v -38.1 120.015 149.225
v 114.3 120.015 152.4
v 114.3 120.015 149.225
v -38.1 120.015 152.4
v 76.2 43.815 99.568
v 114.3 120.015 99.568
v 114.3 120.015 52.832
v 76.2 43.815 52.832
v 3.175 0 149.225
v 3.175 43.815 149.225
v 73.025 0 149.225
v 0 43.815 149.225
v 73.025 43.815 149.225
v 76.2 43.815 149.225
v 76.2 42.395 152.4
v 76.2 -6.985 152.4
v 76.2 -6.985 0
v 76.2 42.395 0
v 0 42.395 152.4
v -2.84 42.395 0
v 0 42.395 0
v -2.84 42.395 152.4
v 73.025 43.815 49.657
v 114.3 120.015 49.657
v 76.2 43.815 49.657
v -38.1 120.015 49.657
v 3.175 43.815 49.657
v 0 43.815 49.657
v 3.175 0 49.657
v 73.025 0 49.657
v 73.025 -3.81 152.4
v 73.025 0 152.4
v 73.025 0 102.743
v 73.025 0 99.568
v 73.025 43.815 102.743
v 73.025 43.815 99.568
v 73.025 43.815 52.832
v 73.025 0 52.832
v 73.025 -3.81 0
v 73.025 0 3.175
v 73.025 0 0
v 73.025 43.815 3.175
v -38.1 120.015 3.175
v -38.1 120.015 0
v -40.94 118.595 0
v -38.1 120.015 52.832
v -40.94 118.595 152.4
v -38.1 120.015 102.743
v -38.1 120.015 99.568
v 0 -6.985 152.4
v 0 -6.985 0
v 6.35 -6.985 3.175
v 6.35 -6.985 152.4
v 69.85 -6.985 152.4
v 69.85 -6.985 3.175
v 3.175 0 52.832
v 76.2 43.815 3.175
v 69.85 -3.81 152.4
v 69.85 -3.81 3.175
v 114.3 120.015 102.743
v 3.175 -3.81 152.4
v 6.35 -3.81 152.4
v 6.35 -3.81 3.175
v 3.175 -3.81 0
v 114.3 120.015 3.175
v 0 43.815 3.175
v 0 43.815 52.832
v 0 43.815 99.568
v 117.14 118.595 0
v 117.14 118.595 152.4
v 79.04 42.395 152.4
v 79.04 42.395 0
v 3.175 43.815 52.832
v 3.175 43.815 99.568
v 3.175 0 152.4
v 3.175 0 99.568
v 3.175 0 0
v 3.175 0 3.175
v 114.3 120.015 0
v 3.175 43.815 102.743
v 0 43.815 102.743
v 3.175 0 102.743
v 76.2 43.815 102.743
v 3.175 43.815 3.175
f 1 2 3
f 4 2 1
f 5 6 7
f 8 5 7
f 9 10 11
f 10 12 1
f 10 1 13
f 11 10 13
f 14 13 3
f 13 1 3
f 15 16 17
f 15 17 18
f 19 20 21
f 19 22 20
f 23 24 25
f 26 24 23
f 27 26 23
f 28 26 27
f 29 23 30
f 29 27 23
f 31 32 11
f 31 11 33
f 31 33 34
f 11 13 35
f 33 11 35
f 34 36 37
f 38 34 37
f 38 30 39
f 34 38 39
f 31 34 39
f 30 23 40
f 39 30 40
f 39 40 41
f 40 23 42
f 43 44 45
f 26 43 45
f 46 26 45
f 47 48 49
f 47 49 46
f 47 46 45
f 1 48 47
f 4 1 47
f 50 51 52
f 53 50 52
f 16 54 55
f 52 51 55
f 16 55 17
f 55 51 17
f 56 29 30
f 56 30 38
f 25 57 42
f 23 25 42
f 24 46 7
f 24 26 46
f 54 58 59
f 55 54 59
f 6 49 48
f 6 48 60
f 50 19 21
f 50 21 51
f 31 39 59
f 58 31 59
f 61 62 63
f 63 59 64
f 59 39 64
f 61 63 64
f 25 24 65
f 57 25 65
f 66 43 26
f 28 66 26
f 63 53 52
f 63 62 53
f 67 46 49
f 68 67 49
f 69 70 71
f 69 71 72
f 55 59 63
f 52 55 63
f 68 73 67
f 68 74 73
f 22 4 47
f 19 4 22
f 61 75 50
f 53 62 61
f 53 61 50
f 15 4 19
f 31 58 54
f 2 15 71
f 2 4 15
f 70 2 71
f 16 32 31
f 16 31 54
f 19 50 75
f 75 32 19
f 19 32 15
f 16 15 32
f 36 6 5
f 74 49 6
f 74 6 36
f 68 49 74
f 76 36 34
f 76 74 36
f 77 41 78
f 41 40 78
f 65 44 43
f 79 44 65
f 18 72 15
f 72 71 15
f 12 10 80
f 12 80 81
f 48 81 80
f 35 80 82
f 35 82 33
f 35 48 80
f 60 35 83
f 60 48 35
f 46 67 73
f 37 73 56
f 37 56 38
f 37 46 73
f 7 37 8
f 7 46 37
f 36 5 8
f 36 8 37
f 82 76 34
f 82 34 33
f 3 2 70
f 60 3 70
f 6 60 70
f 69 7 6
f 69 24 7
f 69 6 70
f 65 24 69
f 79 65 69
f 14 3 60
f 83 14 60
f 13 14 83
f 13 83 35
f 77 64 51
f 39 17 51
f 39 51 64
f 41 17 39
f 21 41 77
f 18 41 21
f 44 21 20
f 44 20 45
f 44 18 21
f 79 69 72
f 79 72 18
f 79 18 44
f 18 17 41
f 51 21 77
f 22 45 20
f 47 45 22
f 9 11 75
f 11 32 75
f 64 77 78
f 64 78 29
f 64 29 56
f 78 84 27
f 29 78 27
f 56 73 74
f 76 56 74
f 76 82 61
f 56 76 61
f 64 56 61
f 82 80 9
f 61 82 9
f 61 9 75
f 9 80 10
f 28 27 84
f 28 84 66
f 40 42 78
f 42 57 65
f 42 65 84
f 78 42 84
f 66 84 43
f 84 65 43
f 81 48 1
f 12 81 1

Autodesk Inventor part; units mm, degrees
ref_plane "YZ Plane" through (0, 0, 0) normal (1, 0, 0) x (0, 1, 0)
ref_plane "XZ Plane" through (0, 0, 0) normal (0, 1, 0) x (-1, 0, 0)
ref_plane "XY Plane" through (0, 0, 0) normal (0, 0, 1) x (1, 0, 0)
sketch "Sketch1" plane through (0, 0, 0) normal (0, 1, 0) x (-1, 0, 0)
  line L0 (0, 0) -> (-76.2, 0)
  line L1 (-76.2, 0) -> (-76.2, 152.4)
  line L2 (-76.2, 152.4) -> (0, 152.4)
  line L3 (0, 152.4) -> (0, 0)
  line L4 (-3.175, 149.225) -> (-73.025, 149.225)
  line L5 (-73.025, 149.225) -> (-73.025, 3.175)
  line L6 (-73.025, 3.175) -> (-3.175, 3.175)
  line L7 (-3.175, 3.175) -> (-3.175, 149.225)
  dimension "d0" = 76.2
  dimension "d1" = 152.4
  dimension "d2" = 3.175
extrude "Extrusion1" add sketch "Sketch1" along normal blind 43.815
sketch "Sketch2" plane through (0, 0, 0) normal (0, -1, 0) x (1, 0, 0)
  line L0 (0, 152.4) -> (76.2, 152.4) projected
  line L1 (76.2, 0) -> (0, 0) projected
  line L2 (76.2, 152.4) -> (73.025, 152.4)
  line L3 (73.025, 152.4) -> (73.025, 0)
  line L4 (73.025, 0) -> (76.2, 0)
  line L5 (76.2, 0) -> (76.2, 152.4)
  line L6 (0, 0) -> (3.175, 0)
  line L7 (3.175, 0) -> (3.175, 152.4)
  line L8 (3.175, 152.4) -> (0, 152.4)
  line L9 (0, 152.4) -> (0, 0)
  dimension "d5" = 3.175
  dimension "d6" = 3.175
extrude "Extrusion2" add sketch "Sketch2" along normal blind 3.81 contours L0 L7 L1 L9 | L0 L5 L1 L3
sketch "Sketch3" plane through (0, -3.81, 0) normal (0, -1, 0) x (1, 0, 0)
  line L0 (0, 152.4) -> (76.2, 152.4) projected
  line L1 (76.2, 0) -> (0, 0) projected
  line L2 (76.2, 152.4) -> (69.85, 152.4)
  line L3 (69.85, 152.4) -> (69.85, 0)
  line L4 (69.85, 0) -> (76.2, 0)
  line L5 (76.2, 0) -> (76.2, 152.4)
  line L6 (0, 152.4) -> (6.35, 152.4)
  line L7 (6.35, 152.4) -> (6.35, 0)
  line L8 (6.35, 0) -> (0, 0)
  line L9 (0, 0) -> (0, 152.4)
  dimension "d9" = 6.35
  dimension "d10" = 6.35
extrude "Extrusion3" add sketch "Sketch3" along normal blind 3.175 contours L0 L7 L1 L9 | L0 L5 L1 L3
sketch "Sketch4" plane through (73.025, 0, 0) normal (0, 0, -1) x (-1, 0, 0)
  line L0 (0, -3.81) -> (3.175, -3.81) projected
  line L1 (73.025, -6.985) -> (66.675, -6.985) projected
  line L2 (3.175, -3.81) -> (66.675, -3.81)
  line L3 (66.675, -3.81) -> (66.675, -6.985)
  line L4 (66.675, -6.985) -> (3.175, -6.985)
  line L5 (3.175, -6.985) -> (3.175, -3.81)
  point P0 (73.025, 0)
extrude "Extrusion4" add sketch "Sketch4" against normal blind 3.175
sketch "Sketch5" plane through (3.175, 0, 3.175) normal (1, 0, 0) x (0, 0, -1)
  line L0 (-146.05, 0) -> (-146.05, 43.815) construction
  line L1 (-146.05, 43.815) -> (-99.568, 43.815) construction
  line L2 (-146.05, 43.815) -> (0, 43.815) construction
  line L3 (-99.568, 43.815) -> (-96.393, 43.815) construction
  line L4 (-96.393, 43.815) -> (-49.657, 43.815) construction
  line L5 (-49.657, 43.815) -> (-46.482, 43.815) construction
  line L6 (0, 0) -> (0, 43.815) construction
  line L7 (-46.482, 43.815) -> (0, 43.815) construction
  line L8 (-46.482, 43.815) -> (0, 43.815) construction
  line L9 (-46.482, 43.815) -> (0, 43.815) construction
  line L10 (-99.568, 43.815) -> (-96.393, 43.815)
  line L11 (-96.393, 43.815) -> (-96.393, 0)
  line L12 (-96.393, 0) -> (-99.568, 0)
  line L13 (-99.568, 0) -> (-99.568, 43.815)
  line L14 (-49.657, 43.815) -> (-46.482, 43.815)
  line L15 (-46.482, 43.815) -> (-46.482, 0)
  line L16 (-46.482, 0) -> (-49.657, 0)
  line L17 (-49.657, 0) -> (-49.657, 43.815)
  point P0 (3.175, 0)
  dimension "d15" = 46.482
  dimension "d16" = 3.175
  dimension "d17" = 46.736
  dimension "d18" = 3.175
  dimension "d19" = 43.815
  dimension "d20" = 43.815
extrude "Extrusion5" add sketch "Sketch5" along normal up to next
sketch "Sketch6" plane through (3.175, 0, 152.4) normal (0, 0, 1) x (1, 0, 0)
  line L0 (73.025, 43.815) -> (-3.175, 43.815) projected
  line L1 (-3.175, 43.815) -> (73.025, 43.815)
  line L2 (73.025, 43.815) -> (73.025, 120.015)
  line L3 (73.025, 120.015) -> (-3.175, 120.015)
  line L4 (-3.175, 120.015) -> (-3.175, 43.815)
  point P0 (-3.175, 0)
  dimension "d23" = 76.2
extrude "Extrusion6" add sketch "Sketch6" against normal blind 3.175
sketch "Sketch7" plane through (3.175, 0, 152.4) normal (0, 0, 1) x (1, 0, 0)
  line L0 (73.025, 120.015) -> (73.025, 43.815) projected
  line L1 (73.025, 120.015) -> (111.125, 120.015)
  line L2 (73.025, 43.815) -> (111.125, 120.015)
  line L3 (73.025, 120.015) -> (-3.175, 120.015) projected
  line L4 (-3.175, 120.015) -> (-41.275, 120.015)
  line L5 (-3.175, 120.015) -> (34.925, 120.015) construction
  line L6 (-3.175, 43.815) -> (-3.175, 120.015) projected
  line L7 (-41.275, 120.015) -> (-3.175, 43.815)
  point P0 (-3.175, 0)
  dimension "d26" = 38.1
  dimension "d27" = 38.1
  dimension "d28" = 180
extrude "Extrusion7" add sketch "Sketch7" against normal blind 3.175
sketch "Sketch8" plane through (76.2, 43.815, 0) normal (0, 0, -1) x (-1, 0, 0)
  line L0 (3.175, 0) -> (0, 0) projected
  line L1 (0, 0) -> (-38.1, 76.2)
  line L2 (114.3, 76.2) -> (-38.1, 76.2) projected
  line L3 (-38.1, 76.2) -> (114.3, 76.2)
  line L4 (76.2, 0) -> (73.025, 0) projected
  line L5 (114.3, 76.2) -> (76.2, 0)
  line L6 (0, 0) -> (76.2, 0)
  line L7 (73.025, 0) -> (3.175, 0) projected
  point P0 (76.2, -43.815)
extrude "Extrusion8" add sketch "Sketch8" against normal blind 3.175
sketch "Sketch9" plane through (76.2, 43.815, 152.4) normal (0.8944, -0.4472, 0) x (0, 0, -1)
  line L0 (0, 85.1942) -> (3.175, 85.1942) projected
  line L1 (152.4, 85.1942) -> (152.4, 0) projected
  line L2 (0, 85.1942) -> (152.4, 85.1942)
  line L3 (152.4, 85.1942) -> (152.4, 0)
  line L4 (152.4, 0) -> (0, 0)
  line L5 (0, 0) -> (0, 85.1942)
  point P0 (152.4, -73.267)
extrude "Extrusion9" add sketch "Sketch9" along normal blind 3.175
sketch "Sketch10" plane through (0, 43.815, 0) normal (-0.8944, -0.4472, 0) x (0, 0, 1)
  line L0 (0, 85.1942) -> (3.175, 85.1942) projected
  line L1 (152.4, -45.4369) -> (152.4, 0) projected
  line L2 (0, 85.1942) -> (152.4, 85.1942)
  line L3 (152.4, 85.1942) -> (152.4, 0)
  line L4 (152.4, 0) -> (0, 0)
  line L5 (0, 0) -> (0, 85.1942)
  point P0 (0, -39.1893)
extrude "Extrusion10" add sketch "Sketch10" along normal blind 3.175
sketch "Sketch11" plane through (114.3, 120.015, 152.4) normal (0, 1, 0) x (1, 0, 0)
  line L0 (-111.125, 49.657) -> (-41.275, 49.657) construction
  line L1 (-111.125, 49.657) -> (-152.4, 49.657) construction
  line L2 (-152.4, 3.175) -> (-152.4, 149.225) construction
  line L3 (-111.125, 52.832) -> (-41.275, 52.832) construction
  line L4 (-41.275, 52.832) -> (0, 52.832) construction
  line L5 (0, 149.225) -> (0, 3.175) construction
  line L6 (-111.125, 99.568) -> (-41.275, 99.568) construction
  line L7 (-111.125, 99.568) -> (-152.4, 99.568) construction
  line L8 (-111.125, 102.743) -> (-41.275, 102.743) construction
  line L9 (-41.275, 102.743) -> (0, 102.743) construction
  line L10 (-152.4, 49.657) -> (0, 49.657)
  line L11 (0, 49.657) -> (0, 52.832)
  line L12 (0, 52.832) -> (-152.4, 52.832)
  line L13 (-152.4, 52.832) -> (-152.4, 49.657)
  line L14 (-152.4, 99.568) -> (0, 99.568)
  line L15 (0, 99.568) -> (0, 102.743)
  line L16 (0, 102.743) -> (-152.4, 102.743)
  line L17 (-152.4, 102.743) -> (-152.4, 99.568)
  point P0 (-114.3, 152.4)
extrude "Extrusion11" add sketch "Sketch11" against normal blind 3.175
sketch "Sketch12" plane through (-38.1, 120.015, 102.743) normal (0, 0, 1) x (1, 0, 0)
  line L0 (150.8125, -3.175) -> (1.5875, -3.175) projected
  line L1 (1.5875, -3.175) -> (38.1, -76.2)
  line L2 (38.1, -76.2) -> (114.3, -76.2)
  line L3 (152.4, 0) -> (150.8125, -3.175) projected
  line L4 (114.3, -76.2) -> (150.8125, -3.175)
  line L5 (150.8125, -3.175) -> (1.5875, -3.175)
  point P0 (38.1, -120.015)
extrude "Extrusion12" add sketch "Sketch12" against normal blind 3.175
sketch "Sketch13" plane through (-38.1, 120.015, 52.832) normal (0, 0, 1) x (1, 0, 0)
  line L0 (150.8125, -3.175) -> (1.5875, -3.175) projected
  line L1 (1.5875, -3.175) -> (38.1, -76.2)
  line L2 (38.1, -76.2) -> (114.3, -76.2)
  line L3 (152.4, 0) -> (150.8125, -3.175) projected
  line L4 (114.3, -76.2) -> (150.8125, -3.175)
  line L5 (150.8125, -3.175) -> (1.5875, -3.175)
  point P0 (38.1, -120.015)
extrude "Extrusion13" add sketch "Sketch13" against normal blind 3.175
sketch "Sketch14" plane through (3.175, 0, 152.4) normal (0, 0, 1) x (1, 0, 0)
  line L0 (-3.175, 43.815) -> (-6.0148, 42.3951) projected
  line L1 (-6.0148, 42.3951) -> (-3.175, 42.3951)
  line L2 (-3.175, 43.815) -> (-3.175, -6.985) projected
  line L3 (-3.175, 42.3951) -> (-3.175, 43.815)
  line L4 (-3.175, 43.815) -> (-6.0148, 42.3951)
  line L5 (75.8648, 42.3951) -> (73.025, 42.3951)
  line L6 (73.025, -6.985) -> (73.025, 43.815) projected
  line L7 (73.025, 42.3951) -> (73.025, 43.815)
  line L8 (73.025, 43.815) -> (75.8648, 42.3951)
  line L9 (73.025, 43.815) -> (75.8648, 42.3951) projected
  point P0 (-3.175, 0)
extrude "Extrusion14" add sketch "Sketch14" against normal blind 152.4
properties part number "BeadCompartments_3"
